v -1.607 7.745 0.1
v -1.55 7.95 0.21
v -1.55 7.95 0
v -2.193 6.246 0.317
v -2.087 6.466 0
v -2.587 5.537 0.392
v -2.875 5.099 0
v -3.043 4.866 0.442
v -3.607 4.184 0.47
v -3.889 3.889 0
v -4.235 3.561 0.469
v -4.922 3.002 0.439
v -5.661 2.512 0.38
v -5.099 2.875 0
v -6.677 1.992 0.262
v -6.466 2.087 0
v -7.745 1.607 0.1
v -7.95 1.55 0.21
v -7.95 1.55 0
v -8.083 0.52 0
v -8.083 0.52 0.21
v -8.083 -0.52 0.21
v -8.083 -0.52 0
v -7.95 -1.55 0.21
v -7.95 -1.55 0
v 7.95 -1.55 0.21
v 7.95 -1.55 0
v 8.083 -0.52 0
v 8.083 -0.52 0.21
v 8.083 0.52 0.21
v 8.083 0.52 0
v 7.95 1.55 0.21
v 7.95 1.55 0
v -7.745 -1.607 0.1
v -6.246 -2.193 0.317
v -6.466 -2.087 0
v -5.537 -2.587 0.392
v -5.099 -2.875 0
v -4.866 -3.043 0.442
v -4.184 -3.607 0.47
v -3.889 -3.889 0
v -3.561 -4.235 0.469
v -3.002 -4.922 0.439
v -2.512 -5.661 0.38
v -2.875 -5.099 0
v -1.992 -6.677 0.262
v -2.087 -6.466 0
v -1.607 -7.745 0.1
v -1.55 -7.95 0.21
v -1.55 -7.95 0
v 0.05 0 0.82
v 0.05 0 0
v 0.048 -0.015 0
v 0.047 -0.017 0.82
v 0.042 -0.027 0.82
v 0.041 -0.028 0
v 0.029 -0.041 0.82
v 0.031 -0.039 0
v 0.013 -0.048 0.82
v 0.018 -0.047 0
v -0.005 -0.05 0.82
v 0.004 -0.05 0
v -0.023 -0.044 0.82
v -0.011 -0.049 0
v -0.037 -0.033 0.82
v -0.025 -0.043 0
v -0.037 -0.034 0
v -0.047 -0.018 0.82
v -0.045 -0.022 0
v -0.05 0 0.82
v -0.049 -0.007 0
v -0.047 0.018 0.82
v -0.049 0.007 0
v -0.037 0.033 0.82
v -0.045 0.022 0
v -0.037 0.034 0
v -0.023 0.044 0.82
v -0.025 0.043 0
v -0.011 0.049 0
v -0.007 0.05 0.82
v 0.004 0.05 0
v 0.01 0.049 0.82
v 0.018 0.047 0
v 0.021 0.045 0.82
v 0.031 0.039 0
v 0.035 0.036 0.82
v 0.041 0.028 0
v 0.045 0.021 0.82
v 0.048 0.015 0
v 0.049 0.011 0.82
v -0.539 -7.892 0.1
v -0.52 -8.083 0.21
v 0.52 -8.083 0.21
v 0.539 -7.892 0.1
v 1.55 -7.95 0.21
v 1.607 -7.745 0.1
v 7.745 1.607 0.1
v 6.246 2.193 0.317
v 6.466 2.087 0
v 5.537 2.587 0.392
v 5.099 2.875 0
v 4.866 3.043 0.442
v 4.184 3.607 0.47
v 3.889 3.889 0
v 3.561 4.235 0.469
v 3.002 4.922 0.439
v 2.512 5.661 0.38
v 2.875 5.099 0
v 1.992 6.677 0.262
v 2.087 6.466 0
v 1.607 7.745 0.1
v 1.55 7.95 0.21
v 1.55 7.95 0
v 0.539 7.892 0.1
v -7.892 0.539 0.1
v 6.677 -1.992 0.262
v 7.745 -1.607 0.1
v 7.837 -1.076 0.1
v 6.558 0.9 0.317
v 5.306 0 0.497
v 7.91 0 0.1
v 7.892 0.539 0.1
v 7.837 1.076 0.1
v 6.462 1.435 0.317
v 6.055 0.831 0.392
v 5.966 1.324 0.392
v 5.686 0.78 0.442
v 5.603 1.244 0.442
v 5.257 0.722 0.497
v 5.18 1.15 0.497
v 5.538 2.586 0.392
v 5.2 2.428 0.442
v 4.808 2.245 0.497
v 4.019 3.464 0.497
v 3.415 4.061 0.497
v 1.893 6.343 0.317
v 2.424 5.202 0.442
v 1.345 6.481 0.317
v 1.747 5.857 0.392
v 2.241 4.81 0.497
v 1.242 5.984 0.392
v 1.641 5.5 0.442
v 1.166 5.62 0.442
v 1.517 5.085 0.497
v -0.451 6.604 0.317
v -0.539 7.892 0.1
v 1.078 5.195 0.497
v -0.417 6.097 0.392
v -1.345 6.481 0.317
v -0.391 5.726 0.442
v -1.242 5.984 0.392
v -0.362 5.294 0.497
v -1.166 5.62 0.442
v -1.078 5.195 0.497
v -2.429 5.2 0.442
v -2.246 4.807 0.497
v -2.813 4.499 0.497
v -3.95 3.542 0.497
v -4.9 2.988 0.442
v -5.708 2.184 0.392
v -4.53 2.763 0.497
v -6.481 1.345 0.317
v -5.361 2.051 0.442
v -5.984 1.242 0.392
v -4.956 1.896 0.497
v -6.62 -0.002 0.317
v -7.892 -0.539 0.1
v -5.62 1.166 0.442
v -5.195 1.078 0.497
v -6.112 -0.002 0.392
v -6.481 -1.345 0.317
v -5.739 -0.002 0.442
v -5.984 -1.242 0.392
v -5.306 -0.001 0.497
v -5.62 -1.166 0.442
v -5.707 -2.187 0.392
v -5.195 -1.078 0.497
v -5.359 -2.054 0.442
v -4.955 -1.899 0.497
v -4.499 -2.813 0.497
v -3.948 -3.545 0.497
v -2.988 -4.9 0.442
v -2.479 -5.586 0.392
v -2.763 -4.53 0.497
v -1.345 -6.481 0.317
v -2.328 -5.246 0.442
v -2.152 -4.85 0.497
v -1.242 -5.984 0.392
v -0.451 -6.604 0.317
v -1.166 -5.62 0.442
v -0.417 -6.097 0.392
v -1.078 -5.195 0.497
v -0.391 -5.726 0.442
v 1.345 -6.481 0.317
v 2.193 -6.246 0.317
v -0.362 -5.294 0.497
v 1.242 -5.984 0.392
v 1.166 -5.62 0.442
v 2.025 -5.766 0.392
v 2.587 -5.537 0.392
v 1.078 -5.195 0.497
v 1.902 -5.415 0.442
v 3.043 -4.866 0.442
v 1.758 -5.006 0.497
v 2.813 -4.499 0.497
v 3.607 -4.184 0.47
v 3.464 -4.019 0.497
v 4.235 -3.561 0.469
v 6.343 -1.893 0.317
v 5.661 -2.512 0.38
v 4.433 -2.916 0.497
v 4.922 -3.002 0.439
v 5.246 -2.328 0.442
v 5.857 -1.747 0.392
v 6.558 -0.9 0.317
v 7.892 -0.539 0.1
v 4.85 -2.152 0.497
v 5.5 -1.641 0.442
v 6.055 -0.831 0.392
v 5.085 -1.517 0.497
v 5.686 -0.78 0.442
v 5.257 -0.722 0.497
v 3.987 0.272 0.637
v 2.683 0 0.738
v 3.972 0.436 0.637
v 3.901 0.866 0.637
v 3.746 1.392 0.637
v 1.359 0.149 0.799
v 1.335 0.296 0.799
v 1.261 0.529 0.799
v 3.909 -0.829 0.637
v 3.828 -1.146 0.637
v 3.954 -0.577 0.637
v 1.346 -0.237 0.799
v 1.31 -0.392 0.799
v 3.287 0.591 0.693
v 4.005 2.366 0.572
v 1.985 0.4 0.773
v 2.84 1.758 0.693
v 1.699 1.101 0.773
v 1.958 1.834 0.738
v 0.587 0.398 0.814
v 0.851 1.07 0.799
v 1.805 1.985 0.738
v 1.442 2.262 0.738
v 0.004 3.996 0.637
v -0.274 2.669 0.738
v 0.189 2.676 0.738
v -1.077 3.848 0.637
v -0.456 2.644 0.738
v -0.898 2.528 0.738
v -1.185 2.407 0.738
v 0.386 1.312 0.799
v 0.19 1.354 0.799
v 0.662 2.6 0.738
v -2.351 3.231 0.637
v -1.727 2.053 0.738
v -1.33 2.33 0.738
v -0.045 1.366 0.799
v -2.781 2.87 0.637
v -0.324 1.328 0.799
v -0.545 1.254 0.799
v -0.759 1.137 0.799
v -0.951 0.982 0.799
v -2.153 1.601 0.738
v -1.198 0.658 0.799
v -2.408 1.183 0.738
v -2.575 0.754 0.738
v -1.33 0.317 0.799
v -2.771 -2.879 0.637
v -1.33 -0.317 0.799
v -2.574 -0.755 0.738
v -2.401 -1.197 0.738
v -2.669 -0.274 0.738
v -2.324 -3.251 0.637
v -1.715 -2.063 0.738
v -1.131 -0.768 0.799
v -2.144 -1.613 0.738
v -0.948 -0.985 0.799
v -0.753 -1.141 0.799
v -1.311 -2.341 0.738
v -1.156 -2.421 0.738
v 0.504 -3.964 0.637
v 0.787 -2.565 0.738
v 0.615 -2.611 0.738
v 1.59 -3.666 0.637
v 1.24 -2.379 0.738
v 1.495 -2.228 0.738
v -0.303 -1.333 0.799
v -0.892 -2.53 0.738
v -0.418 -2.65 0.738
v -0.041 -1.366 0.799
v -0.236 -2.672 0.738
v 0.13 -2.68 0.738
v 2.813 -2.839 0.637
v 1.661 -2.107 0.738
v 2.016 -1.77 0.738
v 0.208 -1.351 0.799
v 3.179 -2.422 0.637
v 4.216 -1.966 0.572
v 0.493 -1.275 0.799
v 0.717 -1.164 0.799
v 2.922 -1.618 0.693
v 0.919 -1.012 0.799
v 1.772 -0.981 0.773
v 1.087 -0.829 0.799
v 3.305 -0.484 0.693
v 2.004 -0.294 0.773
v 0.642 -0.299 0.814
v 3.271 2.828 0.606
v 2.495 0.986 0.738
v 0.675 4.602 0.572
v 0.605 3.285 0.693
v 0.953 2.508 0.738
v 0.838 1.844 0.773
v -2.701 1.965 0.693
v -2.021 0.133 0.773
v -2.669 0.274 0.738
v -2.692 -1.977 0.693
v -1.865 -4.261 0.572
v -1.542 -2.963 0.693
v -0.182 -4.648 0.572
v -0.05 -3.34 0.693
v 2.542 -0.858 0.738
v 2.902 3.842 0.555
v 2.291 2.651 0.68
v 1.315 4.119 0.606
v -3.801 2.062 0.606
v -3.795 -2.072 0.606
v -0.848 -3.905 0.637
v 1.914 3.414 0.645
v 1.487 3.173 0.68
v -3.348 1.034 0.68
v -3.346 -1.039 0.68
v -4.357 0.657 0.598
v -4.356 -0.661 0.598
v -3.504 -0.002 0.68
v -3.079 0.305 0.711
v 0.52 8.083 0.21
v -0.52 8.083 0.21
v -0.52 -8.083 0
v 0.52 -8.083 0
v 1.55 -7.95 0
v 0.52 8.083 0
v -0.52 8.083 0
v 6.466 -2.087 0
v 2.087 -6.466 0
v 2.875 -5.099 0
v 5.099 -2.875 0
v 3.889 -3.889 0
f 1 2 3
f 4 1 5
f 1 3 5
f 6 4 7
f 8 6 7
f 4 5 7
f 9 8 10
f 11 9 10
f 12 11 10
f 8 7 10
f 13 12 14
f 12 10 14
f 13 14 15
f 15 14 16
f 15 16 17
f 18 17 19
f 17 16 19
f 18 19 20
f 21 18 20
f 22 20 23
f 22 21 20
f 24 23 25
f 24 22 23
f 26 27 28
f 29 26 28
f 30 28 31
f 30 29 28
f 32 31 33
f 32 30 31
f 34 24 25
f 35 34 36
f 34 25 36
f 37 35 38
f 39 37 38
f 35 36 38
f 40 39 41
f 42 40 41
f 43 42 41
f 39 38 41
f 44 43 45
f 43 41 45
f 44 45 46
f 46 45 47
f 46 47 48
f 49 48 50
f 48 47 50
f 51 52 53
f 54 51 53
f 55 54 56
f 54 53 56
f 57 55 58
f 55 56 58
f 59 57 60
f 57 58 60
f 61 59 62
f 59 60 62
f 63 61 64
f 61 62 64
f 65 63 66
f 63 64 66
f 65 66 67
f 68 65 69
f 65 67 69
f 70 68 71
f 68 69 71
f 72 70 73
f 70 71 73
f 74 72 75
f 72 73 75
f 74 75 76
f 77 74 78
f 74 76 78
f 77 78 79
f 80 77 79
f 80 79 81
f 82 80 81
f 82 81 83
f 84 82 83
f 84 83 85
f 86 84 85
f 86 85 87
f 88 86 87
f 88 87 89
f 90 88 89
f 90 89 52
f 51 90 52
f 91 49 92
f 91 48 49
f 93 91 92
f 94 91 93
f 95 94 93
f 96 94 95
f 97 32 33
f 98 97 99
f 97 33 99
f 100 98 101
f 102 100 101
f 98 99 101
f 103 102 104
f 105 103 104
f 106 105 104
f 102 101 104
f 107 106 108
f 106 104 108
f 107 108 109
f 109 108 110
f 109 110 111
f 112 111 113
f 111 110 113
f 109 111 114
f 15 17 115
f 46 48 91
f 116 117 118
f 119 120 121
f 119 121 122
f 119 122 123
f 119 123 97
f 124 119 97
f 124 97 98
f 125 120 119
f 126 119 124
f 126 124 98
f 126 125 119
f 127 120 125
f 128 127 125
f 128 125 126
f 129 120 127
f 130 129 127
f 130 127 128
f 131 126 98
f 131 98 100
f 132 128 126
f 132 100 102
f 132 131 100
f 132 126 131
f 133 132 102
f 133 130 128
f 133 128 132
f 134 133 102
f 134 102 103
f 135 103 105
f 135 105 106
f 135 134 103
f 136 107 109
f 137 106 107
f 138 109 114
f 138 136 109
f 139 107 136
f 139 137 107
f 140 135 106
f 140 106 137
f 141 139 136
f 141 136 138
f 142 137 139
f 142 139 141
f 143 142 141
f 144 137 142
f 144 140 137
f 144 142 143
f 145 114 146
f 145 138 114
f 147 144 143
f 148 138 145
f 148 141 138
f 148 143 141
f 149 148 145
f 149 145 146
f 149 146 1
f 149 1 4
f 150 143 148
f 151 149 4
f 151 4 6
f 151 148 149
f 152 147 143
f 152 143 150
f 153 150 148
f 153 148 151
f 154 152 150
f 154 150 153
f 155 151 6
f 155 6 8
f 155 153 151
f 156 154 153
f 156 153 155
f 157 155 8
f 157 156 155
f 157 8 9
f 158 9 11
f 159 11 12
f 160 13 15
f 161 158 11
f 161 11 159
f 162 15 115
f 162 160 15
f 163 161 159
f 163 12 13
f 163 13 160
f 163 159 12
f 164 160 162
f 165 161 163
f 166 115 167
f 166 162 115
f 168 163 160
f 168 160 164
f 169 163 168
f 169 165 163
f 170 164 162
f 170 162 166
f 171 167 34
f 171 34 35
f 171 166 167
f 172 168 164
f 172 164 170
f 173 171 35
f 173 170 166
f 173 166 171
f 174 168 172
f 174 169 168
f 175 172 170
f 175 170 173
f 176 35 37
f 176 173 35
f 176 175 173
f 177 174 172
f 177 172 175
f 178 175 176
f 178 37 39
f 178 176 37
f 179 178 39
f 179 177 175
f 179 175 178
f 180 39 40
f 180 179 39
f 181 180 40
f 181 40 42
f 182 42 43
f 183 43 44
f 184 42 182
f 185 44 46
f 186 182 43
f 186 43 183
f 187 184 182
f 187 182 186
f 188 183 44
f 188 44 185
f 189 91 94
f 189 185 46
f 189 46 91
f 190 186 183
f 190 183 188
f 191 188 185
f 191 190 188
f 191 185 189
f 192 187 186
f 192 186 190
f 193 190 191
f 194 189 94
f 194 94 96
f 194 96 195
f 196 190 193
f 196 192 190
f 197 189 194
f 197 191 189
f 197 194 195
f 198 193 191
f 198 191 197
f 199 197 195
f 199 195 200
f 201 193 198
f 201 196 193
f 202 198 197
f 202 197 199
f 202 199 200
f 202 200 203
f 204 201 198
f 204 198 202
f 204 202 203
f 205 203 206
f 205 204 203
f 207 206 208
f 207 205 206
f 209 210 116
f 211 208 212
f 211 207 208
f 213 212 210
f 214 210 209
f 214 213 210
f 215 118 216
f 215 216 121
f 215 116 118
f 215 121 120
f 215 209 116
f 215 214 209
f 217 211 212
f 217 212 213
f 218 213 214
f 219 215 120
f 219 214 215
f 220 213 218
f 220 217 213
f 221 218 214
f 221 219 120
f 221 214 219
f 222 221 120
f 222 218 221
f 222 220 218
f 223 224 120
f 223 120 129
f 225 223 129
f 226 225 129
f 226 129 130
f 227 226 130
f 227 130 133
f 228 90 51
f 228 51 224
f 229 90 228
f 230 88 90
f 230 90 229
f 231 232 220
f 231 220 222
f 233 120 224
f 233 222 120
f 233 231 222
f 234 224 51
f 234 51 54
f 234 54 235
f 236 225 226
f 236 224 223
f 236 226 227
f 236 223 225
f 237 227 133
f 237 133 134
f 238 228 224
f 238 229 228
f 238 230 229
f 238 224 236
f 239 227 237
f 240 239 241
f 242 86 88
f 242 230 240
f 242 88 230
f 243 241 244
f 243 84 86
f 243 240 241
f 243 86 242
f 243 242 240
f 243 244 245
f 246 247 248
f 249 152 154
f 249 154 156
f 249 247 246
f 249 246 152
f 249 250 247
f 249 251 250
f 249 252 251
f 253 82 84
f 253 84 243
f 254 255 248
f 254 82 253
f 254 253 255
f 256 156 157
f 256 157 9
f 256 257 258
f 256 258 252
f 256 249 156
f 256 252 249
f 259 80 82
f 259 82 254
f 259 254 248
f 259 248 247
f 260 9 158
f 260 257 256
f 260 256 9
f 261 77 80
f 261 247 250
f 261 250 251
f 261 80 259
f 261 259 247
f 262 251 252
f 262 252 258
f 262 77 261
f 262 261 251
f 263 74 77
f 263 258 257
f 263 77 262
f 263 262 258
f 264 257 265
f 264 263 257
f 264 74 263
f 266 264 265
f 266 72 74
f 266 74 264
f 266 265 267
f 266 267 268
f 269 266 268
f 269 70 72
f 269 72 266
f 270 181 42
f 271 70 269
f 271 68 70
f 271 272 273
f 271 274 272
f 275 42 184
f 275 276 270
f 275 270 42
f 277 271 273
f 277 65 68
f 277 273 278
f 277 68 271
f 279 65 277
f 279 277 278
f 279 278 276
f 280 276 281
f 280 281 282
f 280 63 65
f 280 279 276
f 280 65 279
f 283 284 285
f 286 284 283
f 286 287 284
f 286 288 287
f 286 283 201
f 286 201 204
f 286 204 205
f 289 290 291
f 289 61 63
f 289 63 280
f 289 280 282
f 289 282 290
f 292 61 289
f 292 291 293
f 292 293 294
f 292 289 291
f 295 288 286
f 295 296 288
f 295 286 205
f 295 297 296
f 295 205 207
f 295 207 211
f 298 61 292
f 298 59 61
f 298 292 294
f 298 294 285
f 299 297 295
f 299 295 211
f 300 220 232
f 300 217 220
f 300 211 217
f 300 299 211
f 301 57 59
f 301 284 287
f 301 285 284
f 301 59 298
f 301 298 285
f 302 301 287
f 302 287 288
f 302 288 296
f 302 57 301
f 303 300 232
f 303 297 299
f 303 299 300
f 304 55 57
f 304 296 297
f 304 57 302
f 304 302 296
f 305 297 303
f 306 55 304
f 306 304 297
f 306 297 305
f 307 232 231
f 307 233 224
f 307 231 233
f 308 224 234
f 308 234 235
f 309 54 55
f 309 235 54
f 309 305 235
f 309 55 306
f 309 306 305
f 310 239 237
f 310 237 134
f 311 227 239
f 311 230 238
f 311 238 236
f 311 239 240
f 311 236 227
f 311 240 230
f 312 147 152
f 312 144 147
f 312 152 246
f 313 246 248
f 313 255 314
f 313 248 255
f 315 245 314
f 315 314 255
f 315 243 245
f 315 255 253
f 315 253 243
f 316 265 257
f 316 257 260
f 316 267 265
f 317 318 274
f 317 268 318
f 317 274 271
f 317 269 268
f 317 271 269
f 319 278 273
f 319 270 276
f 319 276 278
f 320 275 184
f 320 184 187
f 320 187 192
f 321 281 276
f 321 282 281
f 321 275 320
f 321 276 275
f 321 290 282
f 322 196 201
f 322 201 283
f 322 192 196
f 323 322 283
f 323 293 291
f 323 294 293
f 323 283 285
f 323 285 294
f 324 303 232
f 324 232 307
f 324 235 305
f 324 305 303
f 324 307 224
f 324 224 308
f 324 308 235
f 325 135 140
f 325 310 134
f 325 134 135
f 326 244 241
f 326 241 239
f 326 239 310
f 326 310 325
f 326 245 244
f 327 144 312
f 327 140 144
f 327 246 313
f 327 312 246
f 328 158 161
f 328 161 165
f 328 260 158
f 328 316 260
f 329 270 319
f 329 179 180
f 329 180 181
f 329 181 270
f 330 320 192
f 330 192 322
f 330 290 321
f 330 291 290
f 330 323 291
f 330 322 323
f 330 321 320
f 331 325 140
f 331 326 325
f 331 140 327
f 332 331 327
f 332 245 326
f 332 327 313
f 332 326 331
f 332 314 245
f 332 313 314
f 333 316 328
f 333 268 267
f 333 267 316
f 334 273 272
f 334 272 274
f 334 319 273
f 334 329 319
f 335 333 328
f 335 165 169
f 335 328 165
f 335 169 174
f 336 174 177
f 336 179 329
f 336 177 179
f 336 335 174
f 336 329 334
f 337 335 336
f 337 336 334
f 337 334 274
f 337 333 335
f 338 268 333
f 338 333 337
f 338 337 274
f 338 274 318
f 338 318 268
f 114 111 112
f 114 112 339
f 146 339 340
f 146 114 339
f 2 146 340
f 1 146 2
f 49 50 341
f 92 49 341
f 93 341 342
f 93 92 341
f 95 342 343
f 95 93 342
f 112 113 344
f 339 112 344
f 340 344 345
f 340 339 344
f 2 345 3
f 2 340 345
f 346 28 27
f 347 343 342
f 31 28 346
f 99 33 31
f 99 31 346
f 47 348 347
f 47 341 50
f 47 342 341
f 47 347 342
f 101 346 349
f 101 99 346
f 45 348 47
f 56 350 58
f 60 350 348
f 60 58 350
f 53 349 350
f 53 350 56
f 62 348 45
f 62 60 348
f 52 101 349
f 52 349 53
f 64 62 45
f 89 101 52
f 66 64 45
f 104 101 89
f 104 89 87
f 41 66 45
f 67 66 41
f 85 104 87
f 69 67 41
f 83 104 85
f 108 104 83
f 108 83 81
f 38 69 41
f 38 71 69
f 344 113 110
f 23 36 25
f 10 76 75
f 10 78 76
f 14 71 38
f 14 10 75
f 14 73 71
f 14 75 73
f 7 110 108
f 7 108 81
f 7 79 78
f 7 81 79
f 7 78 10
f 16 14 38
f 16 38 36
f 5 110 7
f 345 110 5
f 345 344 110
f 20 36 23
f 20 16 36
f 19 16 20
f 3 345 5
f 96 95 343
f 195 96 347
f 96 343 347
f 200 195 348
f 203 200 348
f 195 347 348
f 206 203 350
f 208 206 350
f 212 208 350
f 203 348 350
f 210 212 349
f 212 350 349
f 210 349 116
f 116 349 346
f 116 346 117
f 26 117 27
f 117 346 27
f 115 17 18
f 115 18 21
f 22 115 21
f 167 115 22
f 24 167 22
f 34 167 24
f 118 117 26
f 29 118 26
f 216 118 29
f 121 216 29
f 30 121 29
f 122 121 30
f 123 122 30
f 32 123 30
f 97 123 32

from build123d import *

# Parameters (mm, degrees)
F2_R     = 9.018737
F3_DEPTH = 0.821
F4_R     = 0.05
F5_DEPTH = 25


with BuildPart() as f1:
    # F0 (on Front) → F1 (revolve)
    with BuildSketch(Plane.XZ):
        with BuildLine():
            Line((8.1, 0.209697), (7.91, 0.1))
            ThreePointArc((7.91, 0.1), (3.971351, 0.639629), (0, 0.82))
            Line((0, 0.82), (0, 0))
            Line((0, 0), (8.1, 0))
            Line((8.1, 0), (8.1, 0.209697))
        make_face()
    revolve(axis=Axis((0, 0, 0.41), (0, 0, 1)))

    # F2 (on face) → F3 (cut, through all)
    with BuildSketch(Plane(origin=(0, 0, 0), x_dir=(1, 0, 0), z_dir=(0, 0, -1))):
        with Locations((-10.266297, 10.266297)):
            Circle(F2_R)
        with Locations((10.266297, 10.266297)):
            Circle(F2_R)
        with Locations((-10.266297, -10.266297)):
            Circle(F2_R)
        with Locations((10.266297, -10.266297)):
            Circle(F2_R)
    extrude(amount=-F3_DEPTH, mode=Mode.SUBTRACT)

    # F4 (on face) → F5 (cut)
    with BuildSketch(Plane(origin=(0, 0, 0), x_dir=(1, 0, 0), z_dir=(0, 0, -1))):
        Circle(F4_R)
    extrude(amount=-F5_DEPTH, mode=Mode.SUBTRACT)


solid = f1.part
